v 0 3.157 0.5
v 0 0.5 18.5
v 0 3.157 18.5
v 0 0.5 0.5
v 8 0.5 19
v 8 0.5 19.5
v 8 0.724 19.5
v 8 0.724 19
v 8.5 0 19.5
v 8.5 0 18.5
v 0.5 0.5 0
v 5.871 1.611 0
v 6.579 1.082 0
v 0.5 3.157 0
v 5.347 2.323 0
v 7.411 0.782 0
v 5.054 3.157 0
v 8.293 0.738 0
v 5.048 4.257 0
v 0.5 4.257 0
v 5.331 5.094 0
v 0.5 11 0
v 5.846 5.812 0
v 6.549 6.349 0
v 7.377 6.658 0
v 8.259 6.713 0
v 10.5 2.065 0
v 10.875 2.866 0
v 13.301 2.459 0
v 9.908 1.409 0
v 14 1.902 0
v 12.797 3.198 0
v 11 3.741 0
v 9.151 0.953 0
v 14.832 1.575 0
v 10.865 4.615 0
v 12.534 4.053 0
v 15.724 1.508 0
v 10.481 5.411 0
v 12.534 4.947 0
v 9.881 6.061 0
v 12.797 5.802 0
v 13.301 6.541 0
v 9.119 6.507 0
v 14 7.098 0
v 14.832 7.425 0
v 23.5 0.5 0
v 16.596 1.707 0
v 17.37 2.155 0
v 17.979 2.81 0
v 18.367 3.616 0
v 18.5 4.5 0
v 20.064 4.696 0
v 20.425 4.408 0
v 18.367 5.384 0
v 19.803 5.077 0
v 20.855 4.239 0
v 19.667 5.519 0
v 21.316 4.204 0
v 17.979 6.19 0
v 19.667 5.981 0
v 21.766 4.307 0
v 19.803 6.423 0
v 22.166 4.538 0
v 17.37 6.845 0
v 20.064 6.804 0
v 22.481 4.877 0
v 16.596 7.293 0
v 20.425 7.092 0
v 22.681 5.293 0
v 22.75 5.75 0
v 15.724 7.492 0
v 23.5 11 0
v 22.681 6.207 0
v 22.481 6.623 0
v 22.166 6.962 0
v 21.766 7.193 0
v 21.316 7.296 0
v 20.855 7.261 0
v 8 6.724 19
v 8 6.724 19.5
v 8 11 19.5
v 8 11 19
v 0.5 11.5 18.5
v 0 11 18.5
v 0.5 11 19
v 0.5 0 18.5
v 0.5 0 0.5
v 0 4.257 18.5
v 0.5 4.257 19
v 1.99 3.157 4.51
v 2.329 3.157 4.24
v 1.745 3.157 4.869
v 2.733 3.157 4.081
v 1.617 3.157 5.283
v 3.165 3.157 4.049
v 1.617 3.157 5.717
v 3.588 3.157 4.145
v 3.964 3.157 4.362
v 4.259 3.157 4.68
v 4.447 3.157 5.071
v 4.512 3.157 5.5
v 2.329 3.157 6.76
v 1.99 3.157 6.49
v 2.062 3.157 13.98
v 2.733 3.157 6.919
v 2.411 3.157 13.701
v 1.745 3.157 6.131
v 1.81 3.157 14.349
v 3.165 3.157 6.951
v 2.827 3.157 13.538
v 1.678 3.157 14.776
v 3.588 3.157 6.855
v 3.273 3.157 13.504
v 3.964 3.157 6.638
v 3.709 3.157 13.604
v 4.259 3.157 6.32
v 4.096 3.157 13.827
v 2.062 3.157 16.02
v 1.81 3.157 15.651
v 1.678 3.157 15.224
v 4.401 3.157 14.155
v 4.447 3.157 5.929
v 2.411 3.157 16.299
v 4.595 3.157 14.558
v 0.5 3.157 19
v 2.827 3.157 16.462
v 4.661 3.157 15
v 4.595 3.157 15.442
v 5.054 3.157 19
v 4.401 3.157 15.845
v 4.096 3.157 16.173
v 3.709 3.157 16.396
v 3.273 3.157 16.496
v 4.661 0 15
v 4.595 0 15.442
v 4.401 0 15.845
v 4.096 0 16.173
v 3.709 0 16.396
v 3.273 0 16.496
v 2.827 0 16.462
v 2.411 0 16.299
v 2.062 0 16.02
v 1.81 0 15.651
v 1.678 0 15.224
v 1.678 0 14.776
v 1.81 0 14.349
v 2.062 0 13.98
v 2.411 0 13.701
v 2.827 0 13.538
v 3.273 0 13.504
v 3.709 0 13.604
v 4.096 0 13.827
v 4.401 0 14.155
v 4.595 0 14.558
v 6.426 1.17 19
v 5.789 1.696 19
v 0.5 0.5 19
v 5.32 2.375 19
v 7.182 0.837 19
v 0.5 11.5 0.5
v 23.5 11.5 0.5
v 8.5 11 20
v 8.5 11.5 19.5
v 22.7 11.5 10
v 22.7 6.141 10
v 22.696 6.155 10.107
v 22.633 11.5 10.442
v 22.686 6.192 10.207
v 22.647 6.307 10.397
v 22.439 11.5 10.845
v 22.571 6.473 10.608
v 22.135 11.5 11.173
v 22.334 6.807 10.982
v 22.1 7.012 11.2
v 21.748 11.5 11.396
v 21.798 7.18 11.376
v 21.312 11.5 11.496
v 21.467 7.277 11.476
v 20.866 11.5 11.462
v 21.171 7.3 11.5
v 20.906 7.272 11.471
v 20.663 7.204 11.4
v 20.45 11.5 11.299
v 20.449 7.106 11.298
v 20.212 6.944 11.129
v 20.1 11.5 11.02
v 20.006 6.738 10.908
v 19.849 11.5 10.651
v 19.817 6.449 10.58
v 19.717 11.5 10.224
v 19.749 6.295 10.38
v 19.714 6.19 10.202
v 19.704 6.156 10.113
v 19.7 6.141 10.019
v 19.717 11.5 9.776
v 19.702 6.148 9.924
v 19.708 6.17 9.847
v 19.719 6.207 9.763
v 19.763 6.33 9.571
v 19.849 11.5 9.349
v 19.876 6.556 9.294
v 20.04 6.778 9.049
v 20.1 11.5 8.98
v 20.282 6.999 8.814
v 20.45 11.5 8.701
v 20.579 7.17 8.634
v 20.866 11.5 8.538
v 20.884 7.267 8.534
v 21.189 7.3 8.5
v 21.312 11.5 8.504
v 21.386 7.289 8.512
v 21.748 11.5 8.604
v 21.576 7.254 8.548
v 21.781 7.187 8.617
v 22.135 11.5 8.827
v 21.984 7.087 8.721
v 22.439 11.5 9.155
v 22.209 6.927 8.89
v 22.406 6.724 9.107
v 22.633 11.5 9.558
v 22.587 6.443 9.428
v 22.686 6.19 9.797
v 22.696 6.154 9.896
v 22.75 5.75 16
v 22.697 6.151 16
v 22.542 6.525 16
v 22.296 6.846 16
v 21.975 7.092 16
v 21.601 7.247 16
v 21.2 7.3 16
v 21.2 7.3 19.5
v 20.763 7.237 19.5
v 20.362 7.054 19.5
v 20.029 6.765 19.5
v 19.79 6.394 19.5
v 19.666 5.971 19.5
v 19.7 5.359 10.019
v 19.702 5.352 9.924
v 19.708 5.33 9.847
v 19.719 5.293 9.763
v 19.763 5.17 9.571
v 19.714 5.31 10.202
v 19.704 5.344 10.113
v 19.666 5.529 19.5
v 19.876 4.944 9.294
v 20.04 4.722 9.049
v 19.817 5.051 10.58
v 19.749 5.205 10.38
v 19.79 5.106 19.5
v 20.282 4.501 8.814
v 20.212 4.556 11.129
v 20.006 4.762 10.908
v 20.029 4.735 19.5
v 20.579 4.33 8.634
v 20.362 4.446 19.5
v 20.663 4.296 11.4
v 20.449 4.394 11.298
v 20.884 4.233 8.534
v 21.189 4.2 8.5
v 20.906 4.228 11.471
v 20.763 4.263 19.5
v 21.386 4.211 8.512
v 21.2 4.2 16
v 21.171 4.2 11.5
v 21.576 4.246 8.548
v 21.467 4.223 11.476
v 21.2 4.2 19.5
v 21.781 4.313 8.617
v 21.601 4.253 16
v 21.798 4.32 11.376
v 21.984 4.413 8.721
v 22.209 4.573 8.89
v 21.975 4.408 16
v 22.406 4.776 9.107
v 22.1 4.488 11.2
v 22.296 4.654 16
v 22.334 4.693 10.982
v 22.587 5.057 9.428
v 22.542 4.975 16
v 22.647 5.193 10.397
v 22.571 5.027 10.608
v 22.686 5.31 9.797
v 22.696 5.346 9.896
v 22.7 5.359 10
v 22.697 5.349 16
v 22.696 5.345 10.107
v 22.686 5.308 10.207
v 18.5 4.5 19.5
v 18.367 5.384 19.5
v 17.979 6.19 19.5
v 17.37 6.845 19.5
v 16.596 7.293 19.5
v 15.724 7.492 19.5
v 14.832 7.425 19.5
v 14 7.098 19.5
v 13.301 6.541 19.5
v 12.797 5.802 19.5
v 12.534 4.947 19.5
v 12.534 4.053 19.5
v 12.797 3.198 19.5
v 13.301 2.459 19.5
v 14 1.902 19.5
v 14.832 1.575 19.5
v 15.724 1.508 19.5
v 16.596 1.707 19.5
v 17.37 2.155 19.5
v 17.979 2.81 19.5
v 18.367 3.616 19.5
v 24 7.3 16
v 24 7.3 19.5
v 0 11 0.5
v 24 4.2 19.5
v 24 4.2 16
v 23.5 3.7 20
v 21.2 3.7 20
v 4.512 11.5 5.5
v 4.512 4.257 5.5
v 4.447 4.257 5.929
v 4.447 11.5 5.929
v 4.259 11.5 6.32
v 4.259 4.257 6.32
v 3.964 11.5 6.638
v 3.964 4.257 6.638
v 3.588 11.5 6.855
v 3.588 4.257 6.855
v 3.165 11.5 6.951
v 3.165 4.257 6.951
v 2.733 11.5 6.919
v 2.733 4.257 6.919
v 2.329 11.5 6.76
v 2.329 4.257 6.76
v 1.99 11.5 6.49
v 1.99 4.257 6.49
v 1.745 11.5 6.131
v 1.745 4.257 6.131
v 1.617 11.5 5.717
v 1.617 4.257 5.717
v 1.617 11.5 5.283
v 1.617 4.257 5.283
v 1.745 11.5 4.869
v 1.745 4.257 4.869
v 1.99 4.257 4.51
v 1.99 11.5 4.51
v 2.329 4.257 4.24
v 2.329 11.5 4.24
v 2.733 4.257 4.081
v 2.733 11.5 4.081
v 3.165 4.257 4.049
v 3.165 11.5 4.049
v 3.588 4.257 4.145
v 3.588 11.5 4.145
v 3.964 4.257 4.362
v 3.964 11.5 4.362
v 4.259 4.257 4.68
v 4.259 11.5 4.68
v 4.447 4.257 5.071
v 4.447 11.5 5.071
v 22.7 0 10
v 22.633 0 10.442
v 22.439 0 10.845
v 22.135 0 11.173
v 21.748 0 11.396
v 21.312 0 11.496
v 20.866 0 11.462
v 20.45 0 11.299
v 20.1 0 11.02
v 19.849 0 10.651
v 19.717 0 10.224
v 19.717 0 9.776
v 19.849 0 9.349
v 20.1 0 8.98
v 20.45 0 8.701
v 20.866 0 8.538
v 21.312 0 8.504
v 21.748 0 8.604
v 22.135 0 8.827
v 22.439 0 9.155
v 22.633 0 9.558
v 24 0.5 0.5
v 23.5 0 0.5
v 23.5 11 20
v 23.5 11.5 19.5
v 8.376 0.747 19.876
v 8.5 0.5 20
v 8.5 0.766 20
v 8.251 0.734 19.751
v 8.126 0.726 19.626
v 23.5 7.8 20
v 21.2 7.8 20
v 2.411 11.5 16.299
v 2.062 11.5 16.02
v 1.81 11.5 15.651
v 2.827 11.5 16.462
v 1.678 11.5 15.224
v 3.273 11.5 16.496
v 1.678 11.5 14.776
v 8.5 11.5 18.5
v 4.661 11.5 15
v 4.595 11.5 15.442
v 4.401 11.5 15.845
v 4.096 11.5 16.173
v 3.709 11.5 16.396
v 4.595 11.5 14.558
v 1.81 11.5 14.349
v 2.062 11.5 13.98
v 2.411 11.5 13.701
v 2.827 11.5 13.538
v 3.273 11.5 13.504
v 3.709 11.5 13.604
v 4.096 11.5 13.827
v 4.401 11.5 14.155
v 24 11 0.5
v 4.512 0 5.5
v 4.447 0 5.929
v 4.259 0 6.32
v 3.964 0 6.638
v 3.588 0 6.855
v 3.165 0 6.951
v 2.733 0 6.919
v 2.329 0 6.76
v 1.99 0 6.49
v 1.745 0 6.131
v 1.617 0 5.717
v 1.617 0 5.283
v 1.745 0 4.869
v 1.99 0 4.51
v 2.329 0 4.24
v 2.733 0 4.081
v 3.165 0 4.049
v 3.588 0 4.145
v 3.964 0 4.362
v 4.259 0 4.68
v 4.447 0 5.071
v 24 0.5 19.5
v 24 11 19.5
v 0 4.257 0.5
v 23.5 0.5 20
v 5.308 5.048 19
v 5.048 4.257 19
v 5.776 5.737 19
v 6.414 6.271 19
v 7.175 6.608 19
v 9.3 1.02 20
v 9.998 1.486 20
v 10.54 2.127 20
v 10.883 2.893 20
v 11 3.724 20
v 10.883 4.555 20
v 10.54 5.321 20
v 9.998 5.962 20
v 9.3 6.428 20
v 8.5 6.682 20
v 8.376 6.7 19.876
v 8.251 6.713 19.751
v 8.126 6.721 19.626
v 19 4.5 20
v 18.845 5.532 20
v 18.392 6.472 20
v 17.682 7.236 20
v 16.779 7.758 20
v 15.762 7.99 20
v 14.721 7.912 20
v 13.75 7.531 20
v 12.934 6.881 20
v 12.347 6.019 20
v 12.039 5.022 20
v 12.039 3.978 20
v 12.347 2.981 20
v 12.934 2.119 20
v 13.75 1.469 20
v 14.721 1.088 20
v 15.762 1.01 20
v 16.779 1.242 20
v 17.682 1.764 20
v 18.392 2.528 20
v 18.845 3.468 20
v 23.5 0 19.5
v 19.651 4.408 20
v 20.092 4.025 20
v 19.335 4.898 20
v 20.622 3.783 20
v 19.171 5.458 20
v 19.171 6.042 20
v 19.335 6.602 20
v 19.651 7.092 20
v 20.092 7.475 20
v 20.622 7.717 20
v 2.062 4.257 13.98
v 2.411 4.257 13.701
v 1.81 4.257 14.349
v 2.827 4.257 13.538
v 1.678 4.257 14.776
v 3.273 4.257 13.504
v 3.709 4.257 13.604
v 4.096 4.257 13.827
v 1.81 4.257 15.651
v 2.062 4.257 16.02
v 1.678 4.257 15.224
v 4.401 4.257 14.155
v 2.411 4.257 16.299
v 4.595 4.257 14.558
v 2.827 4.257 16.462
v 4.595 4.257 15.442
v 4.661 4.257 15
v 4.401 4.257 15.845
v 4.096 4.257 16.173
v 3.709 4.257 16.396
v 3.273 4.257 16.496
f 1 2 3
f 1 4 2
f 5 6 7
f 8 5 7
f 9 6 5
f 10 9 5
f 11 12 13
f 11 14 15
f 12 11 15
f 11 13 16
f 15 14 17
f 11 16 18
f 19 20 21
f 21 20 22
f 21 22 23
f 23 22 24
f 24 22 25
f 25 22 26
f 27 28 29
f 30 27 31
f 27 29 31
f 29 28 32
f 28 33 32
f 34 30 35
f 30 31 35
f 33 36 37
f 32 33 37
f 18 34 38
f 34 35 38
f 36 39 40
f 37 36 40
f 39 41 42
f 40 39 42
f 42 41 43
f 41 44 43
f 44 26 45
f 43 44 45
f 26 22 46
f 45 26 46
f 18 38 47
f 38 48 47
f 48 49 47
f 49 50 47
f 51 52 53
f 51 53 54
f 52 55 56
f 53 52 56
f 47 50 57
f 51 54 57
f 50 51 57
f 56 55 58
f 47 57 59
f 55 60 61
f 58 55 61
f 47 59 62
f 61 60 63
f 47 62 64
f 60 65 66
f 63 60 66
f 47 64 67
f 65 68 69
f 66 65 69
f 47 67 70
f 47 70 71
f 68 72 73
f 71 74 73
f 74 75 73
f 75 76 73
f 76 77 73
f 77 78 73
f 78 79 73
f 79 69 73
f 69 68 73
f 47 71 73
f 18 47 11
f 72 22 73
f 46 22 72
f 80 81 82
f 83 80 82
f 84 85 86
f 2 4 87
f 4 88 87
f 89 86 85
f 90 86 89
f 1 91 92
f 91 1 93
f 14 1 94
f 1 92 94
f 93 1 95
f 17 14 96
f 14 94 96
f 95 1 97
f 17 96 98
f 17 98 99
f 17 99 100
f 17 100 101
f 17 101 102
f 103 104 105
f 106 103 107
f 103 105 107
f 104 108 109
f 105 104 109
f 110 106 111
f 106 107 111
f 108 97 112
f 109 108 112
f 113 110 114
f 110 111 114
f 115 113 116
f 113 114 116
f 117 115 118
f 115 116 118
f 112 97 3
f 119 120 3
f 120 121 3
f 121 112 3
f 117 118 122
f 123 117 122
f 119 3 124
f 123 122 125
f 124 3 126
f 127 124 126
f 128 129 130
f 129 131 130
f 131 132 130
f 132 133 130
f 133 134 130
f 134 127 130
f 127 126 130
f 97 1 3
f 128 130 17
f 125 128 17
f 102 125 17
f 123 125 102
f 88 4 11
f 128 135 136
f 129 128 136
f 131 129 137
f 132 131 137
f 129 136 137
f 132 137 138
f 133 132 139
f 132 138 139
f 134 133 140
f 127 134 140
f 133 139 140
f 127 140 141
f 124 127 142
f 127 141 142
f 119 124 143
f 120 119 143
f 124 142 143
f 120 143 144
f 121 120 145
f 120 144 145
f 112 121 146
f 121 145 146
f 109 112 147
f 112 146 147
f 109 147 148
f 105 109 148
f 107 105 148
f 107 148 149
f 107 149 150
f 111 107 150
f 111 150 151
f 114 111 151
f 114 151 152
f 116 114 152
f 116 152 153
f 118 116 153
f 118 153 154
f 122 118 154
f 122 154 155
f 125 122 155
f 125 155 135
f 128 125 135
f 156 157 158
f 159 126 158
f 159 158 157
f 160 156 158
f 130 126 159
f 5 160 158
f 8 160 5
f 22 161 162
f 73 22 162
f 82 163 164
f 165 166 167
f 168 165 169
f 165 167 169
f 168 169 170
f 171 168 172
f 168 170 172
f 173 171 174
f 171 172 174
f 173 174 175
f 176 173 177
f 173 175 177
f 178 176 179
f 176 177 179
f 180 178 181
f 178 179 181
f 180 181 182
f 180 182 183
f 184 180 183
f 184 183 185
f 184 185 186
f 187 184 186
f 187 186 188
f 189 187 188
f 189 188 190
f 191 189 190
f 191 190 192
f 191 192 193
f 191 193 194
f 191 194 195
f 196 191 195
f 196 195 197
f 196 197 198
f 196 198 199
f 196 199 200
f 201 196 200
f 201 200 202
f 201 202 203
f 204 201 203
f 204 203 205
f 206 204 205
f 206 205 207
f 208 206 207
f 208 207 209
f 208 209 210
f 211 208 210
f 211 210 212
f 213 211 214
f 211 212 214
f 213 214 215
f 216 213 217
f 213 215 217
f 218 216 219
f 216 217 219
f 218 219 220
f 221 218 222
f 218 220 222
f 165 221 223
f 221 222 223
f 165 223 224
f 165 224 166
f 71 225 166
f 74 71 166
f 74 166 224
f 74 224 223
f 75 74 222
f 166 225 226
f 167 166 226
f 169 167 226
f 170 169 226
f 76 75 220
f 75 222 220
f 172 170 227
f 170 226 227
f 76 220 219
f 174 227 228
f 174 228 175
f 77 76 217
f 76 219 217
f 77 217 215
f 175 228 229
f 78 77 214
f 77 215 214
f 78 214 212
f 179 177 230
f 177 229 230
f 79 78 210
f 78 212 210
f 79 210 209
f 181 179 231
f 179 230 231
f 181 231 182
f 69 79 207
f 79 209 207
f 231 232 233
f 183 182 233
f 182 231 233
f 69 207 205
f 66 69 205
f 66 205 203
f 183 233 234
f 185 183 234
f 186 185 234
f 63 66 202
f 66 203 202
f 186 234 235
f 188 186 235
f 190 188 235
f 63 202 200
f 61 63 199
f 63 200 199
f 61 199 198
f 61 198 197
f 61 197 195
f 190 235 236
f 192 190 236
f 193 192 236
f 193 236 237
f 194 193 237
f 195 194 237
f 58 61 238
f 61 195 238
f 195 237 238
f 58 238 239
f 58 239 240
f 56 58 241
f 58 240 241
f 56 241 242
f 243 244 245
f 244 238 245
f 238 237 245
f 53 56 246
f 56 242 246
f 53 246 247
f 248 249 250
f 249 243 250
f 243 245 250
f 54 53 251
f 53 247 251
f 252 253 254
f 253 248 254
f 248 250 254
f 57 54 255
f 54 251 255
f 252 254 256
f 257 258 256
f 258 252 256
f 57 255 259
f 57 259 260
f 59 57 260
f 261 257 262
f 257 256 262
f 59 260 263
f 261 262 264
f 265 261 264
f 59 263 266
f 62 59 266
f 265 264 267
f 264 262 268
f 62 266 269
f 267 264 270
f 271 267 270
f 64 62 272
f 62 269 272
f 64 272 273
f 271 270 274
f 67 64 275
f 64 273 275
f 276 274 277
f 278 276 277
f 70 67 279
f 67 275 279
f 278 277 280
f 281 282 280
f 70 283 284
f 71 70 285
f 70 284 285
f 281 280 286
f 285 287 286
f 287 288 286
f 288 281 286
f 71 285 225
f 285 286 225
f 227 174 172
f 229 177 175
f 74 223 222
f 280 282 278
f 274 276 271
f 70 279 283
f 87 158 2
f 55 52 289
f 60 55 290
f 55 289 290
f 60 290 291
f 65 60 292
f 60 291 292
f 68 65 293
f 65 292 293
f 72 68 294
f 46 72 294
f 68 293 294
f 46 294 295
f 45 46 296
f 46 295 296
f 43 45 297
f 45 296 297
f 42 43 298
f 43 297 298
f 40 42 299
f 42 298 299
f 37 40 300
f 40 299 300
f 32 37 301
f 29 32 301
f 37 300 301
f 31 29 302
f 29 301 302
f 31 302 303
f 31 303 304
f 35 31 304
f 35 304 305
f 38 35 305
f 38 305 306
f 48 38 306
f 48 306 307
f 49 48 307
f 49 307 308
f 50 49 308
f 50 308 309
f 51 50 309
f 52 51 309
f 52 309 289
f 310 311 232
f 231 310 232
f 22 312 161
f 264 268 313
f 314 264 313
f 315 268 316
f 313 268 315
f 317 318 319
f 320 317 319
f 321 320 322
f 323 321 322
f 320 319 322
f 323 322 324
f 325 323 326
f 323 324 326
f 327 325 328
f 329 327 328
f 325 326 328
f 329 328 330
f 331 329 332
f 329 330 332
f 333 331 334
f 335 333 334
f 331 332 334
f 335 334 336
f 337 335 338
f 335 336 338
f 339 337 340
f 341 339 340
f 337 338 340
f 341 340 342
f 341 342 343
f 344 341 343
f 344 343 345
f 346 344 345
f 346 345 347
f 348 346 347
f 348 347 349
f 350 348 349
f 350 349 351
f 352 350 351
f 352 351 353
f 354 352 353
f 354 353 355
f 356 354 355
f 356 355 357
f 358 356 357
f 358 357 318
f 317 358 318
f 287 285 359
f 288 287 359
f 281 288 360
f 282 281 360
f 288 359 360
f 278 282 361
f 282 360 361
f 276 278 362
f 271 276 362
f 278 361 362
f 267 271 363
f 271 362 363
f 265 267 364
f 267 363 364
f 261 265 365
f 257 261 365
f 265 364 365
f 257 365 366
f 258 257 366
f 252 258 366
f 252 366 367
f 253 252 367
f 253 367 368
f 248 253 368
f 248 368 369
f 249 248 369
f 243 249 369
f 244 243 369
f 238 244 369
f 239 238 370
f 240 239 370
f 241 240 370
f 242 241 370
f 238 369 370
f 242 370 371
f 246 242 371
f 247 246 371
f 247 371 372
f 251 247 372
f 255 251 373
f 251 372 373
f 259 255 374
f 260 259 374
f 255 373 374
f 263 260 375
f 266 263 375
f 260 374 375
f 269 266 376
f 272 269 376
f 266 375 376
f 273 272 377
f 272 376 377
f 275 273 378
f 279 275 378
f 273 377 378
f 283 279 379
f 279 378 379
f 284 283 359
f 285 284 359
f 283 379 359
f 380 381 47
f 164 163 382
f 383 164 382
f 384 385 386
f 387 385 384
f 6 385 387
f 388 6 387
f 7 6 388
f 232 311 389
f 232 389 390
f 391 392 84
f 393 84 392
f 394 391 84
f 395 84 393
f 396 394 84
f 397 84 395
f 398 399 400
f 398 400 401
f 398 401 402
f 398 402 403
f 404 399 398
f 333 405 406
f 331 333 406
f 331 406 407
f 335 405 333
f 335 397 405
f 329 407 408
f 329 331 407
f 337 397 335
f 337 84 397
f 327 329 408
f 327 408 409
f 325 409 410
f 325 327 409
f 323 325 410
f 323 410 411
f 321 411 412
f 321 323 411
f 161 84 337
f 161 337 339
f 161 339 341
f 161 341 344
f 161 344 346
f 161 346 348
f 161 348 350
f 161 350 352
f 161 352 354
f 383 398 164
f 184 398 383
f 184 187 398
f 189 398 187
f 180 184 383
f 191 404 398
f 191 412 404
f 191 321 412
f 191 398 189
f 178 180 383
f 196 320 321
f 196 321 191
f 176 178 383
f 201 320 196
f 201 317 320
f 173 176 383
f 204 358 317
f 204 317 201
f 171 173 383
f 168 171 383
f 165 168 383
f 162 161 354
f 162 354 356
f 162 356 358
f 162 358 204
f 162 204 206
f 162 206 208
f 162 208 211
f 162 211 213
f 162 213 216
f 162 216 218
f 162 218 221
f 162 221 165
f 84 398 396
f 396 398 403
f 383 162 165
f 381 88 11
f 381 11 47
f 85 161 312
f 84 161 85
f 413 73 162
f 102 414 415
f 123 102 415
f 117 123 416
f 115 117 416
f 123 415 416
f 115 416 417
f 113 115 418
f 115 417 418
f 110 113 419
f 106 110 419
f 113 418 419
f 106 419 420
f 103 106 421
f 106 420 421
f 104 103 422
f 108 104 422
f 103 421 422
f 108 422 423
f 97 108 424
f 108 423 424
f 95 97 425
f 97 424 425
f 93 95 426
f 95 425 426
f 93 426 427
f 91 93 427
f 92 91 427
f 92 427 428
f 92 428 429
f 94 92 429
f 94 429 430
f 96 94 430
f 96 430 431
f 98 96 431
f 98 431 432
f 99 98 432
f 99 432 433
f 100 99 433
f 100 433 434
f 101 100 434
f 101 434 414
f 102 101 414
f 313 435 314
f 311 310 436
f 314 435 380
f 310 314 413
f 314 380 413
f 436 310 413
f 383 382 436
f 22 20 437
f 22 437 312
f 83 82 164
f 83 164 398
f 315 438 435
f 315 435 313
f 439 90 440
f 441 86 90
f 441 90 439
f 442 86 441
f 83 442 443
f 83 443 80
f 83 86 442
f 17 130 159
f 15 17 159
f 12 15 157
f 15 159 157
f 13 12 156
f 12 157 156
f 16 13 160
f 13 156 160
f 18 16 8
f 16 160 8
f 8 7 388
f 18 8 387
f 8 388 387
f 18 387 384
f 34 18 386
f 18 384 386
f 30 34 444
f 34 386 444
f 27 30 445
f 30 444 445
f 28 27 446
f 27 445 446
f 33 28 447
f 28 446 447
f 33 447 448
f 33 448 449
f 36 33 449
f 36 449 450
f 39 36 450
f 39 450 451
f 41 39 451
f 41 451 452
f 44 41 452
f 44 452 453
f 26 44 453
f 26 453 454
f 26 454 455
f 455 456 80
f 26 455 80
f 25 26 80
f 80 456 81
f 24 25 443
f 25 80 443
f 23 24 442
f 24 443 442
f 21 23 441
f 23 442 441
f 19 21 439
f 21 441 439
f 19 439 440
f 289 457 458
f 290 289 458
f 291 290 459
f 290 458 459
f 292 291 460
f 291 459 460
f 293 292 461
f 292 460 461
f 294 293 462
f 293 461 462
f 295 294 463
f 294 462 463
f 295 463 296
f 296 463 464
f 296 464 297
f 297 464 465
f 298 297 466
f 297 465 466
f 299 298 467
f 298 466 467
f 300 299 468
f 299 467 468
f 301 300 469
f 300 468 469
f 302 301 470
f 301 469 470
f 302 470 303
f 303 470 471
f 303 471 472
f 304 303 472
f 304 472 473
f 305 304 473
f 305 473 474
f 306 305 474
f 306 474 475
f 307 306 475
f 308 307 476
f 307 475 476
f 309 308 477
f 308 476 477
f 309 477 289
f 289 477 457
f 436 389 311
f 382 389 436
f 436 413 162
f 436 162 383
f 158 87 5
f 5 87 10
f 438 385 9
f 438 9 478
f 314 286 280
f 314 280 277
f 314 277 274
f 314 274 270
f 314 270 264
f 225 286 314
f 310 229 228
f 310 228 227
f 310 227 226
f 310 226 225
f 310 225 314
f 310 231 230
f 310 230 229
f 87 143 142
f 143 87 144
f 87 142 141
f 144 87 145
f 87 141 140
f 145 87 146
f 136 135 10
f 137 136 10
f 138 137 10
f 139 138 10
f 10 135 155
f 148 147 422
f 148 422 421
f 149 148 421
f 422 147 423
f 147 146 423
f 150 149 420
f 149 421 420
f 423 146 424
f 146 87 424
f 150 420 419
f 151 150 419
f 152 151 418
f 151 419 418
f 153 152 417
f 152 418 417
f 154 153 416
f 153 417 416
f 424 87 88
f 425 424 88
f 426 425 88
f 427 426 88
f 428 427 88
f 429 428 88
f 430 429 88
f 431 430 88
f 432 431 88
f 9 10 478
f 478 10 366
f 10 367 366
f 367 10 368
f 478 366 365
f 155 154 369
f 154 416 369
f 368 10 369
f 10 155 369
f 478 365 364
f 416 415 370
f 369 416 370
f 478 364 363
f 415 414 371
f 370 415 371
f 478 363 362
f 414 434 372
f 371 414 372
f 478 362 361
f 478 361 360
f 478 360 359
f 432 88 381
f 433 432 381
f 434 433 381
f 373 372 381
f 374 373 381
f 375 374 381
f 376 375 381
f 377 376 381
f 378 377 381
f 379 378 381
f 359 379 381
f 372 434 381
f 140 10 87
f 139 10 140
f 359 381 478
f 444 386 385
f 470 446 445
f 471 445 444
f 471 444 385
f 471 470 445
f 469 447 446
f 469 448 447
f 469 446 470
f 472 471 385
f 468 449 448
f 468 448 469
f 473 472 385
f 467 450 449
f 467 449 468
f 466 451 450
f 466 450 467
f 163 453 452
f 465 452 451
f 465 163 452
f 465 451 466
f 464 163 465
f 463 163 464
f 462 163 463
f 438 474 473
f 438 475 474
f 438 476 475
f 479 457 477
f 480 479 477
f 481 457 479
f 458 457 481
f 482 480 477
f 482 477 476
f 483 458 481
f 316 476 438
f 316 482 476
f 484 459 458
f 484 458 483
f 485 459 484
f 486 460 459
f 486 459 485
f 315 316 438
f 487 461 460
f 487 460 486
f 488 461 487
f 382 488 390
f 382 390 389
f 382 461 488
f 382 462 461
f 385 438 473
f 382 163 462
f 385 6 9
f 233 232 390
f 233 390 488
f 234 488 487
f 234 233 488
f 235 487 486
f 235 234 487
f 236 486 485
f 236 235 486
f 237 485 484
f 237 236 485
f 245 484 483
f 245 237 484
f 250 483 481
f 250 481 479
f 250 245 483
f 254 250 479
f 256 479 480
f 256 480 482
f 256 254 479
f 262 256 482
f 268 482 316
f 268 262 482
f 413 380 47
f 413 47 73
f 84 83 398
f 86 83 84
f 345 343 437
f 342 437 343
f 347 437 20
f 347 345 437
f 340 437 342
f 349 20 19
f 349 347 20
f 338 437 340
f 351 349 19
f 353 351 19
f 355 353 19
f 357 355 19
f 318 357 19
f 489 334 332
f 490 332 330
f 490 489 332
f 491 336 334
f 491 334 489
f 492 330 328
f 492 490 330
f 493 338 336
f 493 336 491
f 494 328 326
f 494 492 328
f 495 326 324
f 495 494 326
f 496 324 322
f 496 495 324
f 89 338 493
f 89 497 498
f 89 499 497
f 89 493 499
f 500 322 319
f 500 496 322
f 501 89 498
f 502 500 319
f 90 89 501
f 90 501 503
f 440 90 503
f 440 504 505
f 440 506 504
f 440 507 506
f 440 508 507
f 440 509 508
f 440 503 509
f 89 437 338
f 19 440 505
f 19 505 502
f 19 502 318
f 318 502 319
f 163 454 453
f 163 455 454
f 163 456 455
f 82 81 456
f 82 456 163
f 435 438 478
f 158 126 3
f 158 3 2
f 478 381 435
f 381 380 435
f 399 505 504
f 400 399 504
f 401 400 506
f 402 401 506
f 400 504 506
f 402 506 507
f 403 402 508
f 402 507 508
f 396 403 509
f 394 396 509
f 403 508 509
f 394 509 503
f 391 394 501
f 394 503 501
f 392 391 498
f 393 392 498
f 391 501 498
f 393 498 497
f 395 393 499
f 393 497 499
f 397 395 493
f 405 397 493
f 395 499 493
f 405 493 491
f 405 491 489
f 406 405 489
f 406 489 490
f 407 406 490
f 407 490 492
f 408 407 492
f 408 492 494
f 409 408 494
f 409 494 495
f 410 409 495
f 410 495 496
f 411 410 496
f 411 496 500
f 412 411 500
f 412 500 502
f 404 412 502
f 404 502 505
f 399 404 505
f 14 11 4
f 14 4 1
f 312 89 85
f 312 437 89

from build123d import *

# Parameters (mm, degrees)
F0_W      = 24
F0_H      = 11.5
F1_DEPTH  = 20
F2_R      = 3
F2_R_2    = 1.55
F3_DEPTH  = 20.001
F4_R      = 1.5
F4_R_2    = 1.4554355897
F4_R_3    = 1.5000002072
F5_DEPTH  = 11.501
F7_DEPTH  = 4
F9_DEPTH  = 1
F10_SIZE  = 0.5
F11_W     = 14.3343711684
F11_H     = 1.1
F12_DEPTH = 19.0010001


with BuildPart() as f1:
    # F0 (on Top) → F1 (new body)
    with BuildSketch(Plane.XY):
        with Locations((12, 5.75)):
            Rectangle(F0_W, F0_H)
    extrude(amount=F1_DEPTH)

    # F2 (on face) → F3 (cut, through all)
    with BuildSketch(Plane.XY.offset(20)):
        with Locations((8, 3.723813377)):
            Circle(F2_R)
        with Locations((15.5, 4.5)):
            Circle(F2_R)
        with Locations((21.2, 5.75)):
            Circle(F2_R_2)
    extrude(amount=-F3_DEPTH, mode=Mode.SUBTRACT)

    # F4 (on face) → F5 (cut, through all)
    with BuildSketch(Plane.XZ):
        with Locations((21.2, 10)):
            Circle(F4_R)
        with Locations((3.0564678513, 5.5)):
            Circle(F4_R_2)
        with Locations((3.1612319104, 15)):
            Circle(F4_R_3)
    extrude(amount=-F5_DEPTH, mode=Mode.SUBTRACT)

    # F6 (on face) → F7 (cut)
    with BuildSketch(Plane.XY.offset(20)):
        with BuildLine():
            Line((24, 7.3), (21.2, 7.3))
            ThreePointArc((21.2, 7.3), (22.2960155108, 6.8460155108), (22.75, 5.75))
            ThreePointArc((22.75, 5.75), (22.2960155108, 4.6539844892), (21.2, 4.2))
            Line((21.2, 4.2), (24, 4.2))
            Line((24, 4.2), (24, 7.3))
        make_face()
    extrude(amount=-F7_DEPTH, mode=Mode.SUBTRACT)

    # F8 (on face) → F9 (cut)
    with BuildSketch(Plane.XY.offset(20)):
        with BuildLine():
            Line((8, 6.723813377), (8, 11.5))
            Line((8, 11.5), (0, 11.5))
            Line((0, 11.5), (0, 0))
            Line((0, 0), (8, 0))
            Line((8, 0), (8, 0.723813377))
            ThreePointArc((8, 0.723813377), (5, 3.723813377), (8, 6.723813377))
        make_face()
    extrude(amount=-F9_DEPTH, mode=Mode.SUBTRACT)

    # F10
    f10_edges = [f1.edges().sort_by_distance(p)[0] for p in [
        (4, 0, 19),
        (0, 5.75, 19),
        (0, 0, 9.5),
        (0, 11.5, 9.5),
        (8, 9.111907, 20),
        (8, 0.361907, 20),
        (8, 0, 19.5),
        (16, 0, 20),
        (24, 2.1, 20),
        (22.6, 4.2, 20),
        (24, 9.4, 20),
        (16, 11.5, 20),
        (24, 0, 10),
        (0, 5.75, 0),
        (12, 0, 0),
        (24, 5.75, 0),
        (12, 11.5, 0),
        (24, 11.5, 10),
        (4, 11.5, 19),
        (8, 11.5, 19.5),
        (12.5, 4.5, 20),
    ]]
    chamfer(f10_edges, length=F10_SIZE)

    # F11 (on face) → F12 (cut, through all)
    with BuildSketch(Plane.XY.offset(19)):
        with Locations((3.4663419938, 3.7068520686)):
            Rectangle(F11_W, F11_H)
    extrude(amount=-F12_DEPTH, mode=Mode.SUBTRACT)


solid = f1.part
